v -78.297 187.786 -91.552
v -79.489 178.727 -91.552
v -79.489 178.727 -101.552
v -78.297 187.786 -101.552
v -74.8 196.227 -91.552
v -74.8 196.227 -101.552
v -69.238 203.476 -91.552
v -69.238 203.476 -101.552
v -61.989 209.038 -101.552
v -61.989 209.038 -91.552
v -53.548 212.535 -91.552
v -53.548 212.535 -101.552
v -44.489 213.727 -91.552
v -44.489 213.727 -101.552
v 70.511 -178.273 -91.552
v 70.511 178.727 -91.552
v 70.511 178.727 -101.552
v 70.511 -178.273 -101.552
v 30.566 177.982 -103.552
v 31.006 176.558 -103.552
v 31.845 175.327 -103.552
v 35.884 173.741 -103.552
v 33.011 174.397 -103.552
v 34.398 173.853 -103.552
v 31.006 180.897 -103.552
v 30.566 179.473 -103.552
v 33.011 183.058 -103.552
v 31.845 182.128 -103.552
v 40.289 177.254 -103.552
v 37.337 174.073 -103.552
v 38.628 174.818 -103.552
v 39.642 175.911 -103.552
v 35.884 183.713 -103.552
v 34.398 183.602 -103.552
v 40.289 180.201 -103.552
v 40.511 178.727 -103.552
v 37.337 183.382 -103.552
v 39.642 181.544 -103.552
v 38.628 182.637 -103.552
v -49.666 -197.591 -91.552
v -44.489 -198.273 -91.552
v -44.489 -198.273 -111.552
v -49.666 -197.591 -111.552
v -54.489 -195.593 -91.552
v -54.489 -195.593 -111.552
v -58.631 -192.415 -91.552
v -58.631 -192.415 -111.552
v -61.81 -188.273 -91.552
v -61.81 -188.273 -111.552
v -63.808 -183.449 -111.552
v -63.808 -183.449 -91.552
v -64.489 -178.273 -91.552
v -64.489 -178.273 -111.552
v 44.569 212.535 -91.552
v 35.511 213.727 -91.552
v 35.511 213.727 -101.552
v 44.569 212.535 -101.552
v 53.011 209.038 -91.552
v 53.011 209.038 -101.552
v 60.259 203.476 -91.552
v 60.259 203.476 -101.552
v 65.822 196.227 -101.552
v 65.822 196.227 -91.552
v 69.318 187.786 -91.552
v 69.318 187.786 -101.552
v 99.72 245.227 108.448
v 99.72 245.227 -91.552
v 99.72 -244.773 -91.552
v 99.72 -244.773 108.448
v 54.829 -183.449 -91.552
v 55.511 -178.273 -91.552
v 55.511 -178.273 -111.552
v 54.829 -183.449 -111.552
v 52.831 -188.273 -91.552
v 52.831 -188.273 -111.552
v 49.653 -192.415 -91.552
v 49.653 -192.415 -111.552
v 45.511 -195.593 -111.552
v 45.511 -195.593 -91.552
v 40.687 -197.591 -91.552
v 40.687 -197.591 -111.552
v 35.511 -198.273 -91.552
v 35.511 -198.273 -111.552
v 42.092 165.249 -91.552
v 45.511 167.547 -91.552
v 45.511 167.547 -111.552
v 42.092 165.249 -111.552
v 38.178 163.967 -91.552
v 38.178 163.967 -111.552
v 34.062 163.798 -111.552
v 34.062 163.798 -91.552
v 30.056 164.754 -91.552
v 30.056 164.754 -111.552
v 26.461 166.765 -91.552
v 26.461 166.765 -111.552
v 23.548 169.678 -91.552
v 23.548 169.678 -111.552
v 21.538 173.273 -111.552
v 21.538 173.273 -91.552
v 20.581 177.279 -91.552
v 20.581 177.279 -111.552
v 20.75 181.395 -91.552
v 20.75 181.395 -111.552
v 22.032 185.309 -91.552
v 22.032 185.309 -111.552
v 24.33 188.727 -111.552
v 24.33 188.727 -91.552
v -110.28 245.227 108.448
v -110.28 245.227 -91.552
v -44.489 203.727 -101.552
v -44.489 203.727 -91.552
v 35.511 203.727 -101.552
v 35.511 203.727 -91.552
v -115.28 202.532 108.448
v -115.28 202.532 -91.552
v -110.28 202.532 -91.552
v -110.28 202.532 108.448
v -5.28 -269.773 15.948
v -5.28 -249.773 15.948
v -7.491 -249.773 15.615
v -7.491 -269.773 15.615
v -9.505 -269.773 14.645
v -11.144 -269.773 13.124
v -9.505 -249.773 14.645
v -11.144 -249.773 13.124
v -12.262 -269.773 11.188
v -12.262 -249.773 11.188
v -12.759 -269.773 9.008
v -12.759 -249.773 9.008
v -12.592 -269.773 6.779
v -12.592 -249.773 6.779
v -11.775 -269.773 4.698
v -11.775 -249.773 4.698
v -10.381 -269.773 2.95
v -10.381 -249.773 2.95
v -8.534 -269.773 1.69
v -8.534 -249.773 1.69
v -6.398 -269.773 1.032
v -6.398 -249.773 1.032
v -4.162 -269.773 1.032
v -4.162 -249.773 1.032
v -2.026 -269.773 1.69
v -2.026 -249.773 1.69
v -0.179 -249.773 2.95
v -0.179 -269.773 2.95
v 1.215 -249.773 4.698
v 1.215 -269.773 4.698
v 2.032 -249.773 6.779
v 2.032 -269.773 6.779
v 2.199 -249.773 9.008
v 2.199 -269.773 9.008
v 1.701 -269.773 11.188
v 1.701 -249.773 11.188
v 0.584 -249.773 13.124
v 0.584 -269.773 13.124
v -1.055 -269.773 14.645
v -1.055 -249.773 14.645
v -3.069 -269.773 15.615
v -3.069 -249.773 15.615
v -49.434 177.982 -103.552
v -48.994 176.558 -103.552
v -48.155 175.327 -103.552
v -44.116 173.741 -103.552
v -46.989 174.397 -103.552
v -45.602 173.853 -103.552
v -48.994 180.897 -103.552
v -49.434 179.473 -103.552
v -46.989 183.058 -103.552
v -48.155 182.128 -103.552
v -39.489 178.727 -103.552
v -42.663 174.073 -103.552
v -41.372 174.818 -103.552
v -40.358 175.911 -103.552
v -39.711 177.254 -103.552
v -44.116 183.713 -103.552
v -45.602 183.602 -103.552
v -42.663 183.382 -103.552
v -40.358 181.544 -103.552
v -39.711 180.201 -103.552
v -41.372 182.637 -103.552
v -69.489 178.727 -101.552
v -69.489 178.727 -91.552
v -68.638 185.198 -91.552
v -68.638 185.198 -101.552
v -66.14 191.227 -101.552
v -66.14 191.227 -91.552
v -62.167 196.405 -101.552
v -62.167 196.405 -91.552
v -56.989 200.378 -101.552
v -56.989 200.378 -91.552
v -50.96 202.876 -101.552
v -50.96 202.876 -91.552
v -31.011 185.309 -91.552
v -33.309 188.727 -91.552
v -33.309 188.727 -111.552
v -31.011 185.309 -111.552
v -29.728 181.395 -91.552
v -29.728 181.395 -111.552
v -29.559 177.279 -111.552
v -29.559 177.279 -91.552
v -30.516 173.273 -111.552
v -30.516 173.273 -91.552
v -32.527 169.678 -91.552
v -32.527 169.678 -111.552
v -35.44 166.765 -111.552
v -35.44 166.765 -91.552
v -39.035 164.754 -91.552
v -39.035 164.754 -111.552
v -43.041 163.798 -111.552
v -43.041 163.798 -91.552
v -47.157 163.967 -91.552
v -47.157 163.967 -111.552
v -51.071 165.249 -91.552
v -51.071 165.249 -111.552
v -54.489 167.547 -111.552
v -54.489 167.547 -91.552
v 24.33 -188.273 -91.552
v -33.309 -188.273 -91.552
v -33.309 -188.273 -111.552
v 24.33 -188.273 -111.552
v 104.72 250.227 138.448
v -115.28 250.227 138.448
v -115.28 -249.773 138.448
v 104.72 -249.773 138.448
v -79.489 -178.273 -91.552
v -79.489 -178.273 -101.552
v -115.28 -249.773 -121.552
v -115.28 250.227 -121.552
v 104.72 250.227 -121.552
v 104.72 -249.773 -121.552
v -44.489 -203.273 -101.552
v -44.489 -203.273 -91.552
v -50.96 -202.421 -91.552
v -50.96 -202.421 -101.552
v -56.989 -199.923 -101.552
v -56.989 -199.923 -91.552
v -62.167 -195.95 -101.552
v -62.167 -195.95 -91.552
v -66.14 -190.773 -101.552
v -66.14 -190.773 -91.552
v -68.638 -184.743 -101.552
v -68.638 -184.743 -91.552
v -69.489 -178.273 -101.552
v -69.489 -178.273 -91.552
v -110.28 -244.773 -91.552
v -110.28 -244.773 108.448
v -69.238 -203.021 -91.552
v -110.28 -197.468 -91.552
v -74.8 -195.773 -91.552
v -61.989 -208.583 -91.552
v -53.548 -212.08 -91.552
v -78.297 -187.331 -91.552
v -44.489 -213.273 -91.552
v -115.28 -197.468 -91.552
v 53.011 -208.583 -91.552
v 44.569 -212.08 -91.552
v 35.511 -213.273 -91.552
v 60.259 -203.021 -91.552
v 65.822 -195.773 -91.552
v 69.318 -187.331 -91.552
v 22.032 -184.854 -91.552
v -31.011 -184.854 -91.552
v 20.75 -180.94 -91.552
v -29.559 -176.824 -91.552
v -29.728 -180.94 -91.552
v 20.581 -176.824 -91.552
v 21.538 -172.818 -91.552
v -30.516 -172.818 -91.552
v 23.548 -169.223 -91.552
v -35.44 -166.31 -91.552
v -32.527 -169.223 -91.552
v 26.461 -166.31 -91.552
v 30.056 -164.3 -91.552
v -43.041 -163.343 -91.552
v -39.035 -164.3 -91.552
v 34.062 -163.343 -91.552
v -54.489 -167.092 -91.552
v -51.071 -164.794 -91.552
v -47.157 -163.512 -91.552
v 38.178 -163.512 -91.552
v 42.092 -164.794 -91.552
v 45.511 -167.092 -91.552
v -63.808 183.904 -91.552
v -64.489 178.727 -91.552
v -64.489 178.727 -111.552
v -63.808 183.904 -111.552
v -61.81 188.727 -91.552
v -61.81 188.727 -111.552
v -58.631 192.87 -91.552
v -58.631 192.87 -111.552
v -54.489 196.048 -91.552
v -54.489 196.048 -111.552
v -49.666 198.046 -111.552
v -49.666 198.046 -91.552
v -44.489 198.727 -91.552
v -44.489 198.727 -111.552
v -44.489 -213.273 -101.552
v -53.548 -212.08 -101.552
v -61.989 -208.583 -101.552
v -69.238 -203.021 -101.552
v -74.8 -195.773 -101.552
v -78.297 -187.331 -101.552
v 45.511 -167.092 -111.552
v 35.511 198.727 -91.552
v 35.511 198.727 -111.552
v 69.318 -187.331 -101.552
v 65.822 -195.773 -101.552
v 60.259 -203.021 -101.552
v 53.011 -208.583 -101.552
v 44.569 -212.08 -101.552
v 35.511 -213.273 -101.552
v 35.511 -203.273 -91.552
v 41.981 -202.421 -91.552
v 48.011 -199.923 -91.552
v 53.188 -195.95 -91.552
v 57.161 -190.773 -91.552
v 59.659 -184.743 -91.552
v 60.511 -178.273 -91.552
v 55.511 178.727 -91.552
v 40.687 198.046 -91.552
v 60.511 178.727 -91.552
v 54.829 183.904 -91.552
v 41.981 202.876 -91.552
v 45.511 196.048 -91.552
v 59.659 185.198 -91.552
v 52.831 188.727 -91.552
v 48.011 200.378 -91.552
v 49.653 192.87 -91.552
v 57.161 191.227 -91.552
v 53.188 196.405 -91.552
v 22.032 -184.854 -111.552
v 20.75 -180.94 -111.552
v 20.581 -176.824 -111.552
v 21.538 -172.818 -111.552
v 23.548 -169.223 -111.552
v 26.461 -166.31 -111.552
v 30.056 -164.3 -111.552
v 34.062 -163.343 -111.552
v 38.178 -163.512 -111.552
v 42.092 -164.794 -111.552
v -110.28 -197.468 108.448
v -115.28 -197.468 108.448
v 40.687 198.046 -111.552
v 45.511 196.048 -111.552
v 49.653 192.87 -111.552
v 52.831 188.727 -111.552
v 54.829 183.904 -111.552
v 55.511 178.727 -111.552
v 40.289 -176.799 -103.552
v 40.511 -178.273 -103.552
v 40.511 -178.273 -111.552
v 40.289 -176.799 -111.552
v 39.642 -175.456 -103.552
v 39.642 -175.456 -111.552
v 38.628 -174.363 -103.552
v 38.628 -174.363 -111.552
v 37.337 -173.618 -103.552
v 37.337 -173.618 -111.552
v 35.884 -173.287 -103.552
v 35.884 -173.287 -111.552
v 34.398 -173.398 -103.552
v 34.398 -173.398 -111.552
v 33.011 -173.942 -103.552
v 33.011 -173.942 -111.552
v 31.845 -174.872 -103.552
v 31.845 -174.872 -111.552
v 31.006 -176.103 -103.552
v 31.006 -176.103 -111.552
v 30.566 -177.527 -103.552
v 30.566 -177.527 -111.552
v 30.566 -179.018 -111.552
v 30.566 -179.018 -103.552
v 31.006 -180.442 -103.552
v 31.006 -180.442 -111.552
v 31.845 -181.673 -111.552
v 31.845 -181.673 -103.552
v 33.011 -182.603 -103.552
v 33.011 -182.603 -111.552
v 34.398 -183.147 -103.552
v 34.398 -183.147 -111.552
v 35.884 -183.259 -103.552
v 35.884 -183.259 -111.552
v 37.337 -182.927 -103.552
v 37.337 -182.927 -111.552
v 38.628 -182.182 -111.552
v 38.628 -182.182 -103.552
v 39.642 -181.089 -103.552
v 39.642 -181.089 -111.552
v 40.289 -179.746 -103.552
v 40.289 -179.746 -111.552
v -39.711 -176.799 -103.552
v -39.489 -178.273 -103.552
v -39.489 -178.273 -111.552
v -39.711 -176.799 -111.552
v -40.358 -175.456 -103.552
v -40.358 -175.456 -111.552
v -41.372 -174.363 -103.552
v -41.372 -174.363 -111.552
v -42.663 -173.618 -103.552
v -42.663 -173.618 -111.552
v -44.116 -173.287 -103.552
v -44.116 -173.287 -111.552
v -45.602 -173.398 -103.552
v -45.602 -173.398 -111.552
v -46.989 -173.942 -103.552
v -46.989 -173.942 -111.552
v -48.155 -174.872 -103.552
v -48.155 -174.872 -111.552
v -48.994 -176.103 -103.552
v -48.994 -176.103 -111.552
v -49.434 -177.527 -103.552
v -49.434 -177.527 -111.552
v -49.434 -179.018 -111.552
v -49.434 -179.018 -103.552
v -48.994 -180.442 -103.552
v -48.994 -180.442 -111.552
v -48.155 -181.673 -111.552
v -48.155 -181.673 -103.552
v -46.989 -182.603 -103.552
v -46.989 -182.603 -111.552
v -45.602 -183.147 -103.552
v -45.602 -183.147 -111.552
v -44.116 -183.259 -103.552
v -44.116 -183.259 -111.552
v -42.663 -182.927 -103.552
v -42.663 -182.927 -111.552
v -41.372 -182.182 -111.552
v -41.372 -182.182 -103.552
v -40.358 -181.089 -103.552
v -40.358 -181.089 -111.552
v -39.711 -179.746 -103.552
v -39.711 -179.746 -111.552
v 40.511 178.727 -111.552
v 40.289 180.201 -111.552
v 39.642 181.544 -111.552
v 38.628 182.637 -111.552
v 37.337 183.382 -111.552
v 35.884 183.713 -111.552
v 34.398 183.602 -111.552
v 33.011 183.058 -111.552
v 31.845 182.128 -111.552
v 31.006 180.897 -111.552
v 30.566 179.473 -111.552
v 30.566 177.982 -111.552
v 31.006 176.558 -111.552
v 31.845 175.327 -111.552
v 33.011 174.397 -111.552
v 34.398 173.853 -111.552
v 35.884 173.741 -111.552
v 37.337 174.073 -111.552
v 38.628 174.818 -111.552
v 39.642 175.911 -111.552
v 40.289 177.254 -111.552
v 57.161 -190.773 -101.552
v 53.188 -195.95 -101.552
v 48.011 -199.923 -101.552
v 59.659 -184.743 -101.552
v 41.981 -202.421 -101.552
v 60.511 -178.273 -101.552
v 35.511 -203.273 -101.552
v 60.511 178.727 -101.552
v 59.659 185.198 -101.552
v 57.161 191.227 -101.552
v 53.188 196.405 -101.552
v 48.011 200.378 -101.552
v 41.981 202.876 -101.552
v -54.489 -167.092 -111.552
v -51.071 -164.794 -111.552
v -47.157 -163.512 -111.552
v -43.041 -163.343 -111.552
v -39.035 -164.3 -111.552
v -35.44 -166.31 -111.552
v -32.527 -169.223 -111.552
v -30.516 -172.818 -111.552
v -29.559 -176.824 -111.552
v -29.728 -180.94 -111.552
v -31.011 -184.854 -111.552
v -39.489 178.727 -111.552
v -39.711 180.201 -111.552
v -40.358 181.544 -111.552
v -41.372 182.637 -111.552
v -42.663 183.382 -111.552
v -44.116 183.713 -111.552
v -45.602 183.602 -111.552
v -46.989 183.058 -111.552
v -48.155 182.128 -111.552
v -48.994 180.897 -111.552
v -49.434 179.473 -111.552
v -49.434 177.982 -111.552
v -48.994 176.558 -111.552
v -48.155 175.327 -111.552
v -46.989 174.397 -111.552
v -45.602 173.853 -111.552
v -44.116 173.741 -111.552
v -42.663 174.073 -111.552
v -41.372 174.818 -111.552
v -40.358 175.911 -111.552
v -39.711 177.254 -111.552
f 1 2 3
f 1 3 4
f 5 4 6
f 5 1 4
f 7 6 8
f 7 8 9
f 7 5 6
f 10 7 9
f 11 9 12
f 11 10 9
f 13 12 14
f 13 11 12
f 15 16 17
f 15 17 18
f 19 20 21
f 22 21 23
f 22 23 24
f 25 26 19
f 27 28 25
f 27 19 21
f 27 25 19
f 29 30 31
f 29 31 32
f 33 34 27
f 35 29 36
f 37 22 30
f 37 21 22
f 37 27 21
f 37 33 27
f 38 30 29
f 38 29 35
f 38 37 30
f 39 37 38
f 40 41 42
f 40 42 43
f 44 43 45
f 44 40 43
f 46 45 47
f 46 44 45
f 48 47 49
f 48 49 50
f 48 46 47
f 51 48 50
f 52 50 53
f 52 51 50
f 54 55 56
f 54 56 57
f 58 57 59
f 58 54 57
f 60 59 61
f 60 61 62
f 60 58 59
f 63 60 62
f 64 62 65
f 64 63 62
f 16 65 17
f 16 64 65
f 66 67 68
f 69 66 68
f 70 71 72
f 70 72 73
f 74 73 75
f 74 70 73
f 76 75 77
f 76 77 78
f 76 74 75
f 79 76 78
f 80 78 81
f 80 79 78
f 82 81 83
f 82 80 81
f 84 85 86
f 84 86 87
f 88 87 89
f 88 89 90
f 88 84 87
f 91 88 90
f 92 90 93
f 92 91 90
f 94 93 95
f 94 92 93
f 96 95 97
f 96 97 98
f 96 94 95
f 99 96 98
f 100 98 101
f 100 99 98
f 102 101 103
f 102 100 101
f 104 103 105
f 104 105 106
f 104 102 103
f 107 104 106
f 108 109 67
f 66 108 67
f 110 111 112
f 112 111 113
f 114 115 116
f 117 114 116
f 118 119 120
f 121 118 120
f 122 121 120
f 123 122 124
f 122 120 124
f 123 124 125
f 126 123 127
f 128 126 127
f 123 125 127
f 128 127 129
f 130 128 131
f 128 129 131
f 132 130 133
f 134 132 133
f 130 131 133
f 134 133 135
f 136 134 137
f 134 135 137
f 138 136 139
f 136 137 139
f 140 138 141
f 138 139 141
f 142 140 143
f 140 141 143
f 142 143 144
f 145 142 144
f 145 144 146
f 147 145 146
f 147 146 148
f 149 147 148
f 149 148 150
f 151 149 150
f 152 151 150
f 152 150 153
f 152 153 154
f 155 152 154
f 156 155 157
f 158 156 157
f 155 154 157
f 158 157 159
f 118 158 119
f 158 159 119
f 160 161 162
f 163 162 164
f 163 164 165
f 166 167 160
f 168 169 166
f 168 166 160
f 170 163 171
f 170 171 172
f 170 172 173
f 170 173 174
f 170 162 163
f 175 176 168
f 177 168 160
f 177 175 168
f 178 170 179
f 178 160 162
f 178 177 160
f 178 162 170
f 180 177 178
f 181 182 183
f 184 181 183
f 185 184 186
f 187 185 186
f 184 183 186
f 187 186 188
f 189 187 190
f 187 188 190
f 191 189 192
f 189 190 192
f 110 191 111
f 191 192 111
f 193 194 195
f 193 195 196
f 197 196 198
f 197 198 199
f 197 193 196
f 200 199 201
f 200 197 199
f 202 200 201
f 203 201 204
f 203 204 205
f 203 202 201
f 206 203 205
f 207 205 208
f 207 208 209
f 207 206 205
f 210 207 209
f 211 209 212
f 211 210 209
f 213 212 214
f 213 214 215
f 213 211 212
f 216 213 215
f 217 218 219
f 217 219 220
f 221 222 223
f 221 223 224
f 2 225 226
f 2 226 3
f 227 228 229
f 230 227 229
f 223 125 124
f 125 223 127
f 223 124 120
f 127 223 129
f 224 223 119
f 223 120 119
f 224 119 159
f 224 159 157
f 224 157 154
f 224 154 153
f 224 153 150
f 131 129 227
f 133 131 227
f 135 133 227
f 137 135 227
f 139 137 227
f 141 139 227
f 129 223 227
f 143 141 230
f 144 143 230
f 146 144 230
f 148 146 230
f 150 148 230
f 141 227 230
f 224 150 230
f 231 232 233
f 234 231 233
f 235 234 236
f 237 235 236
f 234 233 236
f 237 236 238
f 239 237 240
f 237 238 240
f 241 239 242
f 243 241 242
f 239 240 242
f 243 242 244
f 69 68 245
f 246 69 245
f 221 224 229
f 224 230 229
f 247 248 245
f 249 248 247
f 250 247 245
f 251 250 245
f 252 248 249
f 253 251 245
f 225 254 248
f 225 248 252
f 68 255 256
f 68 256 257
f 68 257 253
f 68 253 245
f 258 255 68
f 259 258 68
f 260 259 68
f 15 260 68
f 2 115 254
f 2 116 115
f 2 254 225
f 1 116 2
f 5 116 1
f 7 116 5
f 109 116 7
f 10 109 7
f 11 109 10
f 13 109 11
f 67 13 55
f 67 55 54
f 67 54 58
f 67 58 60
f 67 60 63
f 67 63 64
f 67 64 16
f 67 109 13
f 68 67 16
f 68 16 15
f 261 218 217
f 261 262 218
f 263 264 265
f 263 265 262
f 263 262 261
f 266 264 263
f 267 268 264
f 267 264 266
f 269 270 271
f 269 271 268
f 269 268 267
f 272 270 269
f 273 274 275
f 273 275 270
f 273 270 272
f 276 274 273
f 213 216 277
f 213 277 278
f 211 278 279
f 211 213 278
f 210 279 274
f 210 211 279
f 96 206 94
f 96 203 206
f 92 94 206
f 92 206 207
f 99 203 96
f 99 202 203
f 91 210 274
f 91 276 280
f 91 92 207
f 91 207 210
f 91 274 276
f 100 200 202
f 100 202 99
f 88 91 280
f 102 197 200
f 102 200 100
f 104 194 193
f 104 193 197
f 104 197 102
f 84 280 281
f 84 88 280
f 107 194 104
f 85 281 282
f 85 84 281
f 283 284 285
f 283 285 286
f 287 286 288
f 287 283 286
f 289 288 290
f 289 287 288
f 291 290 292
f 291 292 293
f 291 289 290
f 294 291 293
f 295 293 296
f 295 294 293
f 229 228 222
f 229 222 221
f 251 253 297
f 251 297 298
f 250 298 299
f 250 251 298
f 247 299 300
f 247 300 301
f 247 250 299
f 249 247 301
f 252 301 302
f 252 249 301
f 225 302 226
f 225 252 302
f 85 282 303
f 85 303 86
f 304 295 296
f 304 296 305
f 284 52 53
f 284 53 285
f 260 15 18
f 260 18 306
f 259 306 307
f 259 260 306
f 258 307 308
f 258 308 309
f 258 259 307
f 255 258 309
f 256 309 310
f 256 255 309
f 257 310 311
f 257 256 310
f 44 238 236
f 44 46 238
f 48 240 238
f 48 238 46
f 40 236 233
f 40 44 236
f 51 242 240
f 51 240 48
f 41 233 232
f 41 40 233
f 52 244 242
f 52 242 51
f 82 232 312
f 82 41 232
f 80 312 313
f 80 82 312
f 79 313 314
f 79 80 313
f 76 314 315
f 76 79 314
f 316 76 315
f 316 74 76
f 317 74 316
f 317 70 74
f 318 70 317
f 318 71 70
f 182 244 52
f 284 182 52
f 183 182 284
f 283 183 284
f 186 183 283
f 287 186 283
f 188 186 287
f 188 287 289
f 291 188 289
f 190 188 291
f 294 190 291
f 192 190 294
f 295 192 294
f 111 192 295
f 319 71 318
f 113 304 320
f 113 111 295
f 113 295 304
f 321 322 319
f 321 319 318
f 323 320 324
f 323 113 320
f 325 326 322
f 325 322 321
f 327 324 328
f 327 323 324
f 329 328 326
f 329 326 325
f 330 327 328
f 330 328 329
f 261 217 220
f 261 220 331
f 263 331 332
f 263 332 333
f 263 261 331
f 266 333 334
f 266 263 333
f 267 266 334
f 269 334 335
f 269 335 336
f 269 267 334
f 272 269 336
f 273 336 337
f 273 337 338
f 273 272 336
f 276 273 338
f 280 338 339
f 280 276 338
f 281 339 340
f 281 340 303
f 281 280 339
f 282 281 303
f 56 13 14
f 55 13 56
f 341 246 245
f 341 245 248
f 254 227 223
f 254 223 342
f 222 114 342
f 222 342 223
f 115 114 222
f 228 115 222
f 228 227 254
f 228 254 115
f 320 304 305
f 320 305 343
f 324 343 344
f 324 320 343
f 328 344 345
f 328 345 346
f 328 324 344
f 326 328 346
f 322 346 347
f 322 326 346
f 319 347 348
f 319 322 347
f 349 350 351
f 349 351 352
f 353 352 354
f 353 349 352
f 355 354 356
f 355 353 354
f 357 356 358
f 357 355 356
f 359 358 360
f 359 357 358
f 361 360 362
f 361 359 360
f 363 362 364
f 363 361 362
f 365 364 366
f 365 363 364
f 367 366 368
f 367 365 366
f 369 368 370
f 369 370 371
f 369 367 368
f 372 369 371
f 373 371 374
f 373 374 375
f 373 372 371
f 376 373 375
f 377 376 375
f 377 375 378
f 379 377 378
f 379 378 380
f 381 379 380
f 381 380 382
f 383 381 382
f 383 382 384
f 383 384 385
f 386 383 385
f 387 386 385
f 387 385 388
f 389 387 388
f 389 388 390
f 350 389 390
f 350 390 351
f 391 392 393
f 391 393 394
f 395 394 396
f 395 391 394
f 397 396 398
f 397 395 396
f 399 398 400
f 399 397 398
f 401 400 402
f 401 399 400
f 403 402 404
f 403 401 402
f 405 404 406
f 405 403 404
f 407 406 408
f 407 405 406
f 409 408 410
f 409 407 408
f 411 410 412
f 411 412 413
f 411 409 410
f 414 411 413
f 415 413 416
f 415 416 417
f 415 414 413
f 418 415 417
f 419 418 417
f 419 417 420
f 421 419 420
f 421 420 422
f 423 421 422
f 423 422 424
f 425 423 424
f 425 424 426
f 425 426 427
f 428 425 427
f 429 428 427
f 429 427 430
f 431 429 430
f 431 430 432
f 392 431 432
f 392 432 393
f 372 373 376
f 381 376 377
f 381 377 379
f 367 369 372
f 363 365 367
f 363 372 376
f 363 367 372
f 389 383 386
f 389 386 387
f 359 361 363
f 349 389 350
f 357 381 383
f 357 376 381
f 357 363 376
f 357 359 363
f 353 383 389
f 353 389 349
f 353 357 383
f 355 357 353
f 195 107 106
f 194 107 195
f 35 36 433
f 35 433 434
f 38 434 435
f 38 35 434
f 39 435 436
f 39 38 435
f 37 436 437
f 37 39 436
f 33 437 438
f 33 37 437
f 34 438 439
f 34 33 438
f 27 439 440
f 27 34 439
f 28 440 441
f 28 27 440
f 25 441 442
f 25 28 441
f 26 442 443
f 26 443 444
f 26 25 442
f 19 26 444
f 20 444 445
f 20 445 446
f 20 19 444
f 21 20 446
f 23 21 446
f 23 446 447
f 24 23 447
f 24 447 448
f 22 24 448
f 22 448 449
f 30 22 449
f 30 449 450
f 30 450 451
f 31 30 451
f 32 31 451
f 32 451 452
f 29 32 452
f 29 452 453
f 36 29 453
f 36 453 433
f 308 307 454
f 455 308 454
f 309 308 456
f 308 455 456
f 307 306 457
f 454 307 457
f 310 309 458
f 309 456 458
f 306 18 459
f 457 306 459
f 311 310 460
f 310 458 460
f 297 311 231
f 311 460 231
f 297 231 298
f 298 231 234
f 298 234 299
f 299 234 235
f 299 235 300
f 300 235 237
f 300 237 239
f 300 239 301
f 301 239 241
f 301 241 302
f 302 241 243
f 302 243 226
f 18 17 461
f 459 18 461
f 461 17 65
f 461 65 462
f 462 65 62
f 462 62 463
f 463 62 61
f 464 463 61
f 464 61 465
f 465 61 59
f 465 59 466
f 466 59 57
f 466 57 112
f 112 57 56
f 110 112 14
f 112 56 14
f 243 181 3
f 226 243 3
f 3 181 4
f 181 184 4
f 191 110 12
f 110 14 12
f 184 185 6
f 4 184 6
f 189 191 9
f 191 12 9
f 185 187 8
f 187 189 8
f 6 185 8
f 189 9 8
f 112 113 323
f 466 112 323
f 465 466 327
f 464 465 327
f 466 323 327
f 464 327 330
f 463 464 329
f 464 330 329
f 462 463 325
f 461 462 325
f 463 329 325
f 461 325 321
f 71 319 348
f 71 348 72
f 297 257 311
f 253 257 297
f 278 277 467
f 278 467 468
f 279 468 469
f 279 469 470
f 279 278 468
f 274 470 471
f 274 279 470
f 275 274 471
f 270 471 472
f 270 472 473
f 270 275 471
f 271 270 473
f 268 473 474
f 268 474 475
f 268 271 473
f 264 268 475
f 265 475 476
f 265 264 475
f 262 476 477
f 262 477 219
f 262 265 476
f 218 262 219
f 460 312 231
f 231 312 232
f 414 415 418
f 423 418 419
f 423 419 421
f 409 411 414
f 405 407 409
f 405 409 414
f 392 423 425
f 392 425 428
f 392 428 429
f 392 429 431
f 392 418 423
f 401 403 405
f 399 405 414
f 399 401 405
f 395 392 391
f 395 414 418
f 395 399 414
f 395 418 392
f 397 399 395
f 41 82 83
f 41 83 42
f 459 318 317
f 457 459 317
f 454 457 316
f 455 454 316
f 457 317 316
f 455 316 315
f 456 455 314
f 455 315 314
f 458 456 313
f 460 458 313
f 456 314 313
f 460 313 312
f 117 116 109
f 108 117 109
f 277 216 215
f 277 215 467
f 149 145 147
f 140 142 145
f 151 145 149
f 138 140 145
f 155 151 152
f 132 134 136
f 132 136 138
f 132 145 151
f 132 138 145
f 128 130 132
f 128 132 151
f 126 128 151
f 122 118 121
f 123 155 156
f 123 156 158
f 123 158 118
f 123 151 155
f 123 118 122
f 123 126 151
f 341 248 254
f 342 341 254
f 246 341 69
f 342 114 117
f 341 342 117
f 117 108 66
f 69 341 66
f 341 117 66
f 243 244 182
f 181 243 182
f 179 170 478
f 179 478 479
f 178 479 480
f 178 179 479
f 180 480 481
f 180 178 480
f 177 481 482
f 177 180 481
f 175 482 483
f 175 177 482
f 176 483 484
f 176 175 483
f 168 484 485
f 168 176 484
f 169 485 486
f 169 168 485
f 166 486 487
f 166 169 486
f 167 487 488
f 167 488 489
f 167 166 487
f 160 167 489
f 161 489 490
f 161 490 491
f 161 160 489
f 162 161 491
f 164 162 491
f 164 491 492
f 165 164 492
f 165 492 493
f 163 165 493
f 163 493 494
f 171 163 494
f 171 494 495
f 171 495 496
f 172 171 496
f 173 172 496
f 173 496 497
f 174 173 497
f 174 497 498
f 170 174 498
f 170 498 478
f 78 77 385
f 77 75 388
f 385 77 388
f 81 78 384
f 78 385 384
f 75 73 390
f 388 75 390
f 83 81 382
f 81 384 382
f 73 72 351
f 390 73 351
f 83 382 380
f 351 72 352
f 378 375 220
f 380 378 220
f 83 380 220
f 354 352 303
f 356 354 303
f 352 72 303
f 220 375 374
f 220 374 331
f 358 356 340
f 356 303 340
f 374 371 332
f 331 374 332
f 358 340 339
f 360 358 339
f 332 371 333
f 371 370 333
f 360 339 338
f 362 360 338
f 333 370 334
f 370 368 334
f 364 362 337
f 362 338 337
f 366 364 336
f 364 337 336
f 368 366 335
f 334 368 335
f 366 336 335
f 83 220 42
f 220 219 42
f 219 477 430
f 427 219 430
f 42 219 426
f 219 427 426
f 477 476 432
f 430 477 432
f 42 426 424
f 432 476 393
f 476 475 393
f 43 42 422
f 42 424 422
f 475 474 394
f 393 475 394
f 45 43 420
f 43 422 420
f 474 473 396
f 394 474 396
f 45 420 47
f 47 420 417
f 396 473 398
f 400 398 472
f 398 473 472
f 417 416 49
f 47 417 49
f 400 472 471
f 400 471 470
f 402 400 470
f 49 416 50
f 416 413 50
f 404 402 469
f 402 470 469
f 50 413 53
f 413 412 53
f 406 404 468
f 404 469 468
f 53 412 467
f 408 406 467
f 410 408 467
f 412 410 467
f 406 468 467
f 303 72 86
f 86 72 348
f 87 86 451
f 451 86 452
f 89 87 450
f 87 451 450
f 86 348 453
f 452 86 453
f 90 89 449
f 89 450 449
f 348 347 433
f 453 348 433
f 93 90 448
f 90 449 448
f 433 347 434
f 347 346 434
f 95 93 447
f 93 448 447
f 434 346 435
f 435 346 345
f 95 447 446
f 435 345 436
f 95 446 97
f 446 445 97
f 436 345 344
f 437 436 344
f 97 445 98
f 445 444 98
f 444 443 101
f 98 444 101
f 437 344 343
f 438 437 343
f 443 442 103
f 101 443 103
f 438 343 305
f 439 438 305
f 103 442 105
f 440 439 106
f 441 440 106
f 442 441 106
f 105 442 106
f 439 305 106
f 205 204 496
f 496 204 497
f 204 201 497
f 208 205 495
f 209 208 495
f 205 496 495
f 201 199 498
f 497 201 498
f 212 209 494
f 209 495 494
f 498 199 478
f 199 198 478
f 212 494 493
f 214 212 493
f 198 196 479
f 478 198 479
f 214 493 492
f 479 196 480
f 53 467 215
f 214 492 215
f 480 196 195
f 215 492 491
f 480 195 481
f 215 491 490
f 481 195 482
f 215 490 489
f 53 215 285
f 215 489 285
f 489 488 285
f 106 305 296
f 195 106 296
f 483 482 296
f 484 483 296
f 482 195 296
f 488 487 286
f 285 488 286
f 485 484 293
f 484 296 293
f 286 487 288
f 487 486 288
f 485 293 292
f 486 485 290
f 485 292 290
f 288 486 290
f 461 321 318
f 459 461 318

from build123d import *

# Parameters (mm, degrees)
SKETCH_2_W          = 22
SKETCH_2_H          = 50
EXTRUDE_1_DEPTH     = 3
EXTRUDE_2_DEPTH     = 20
CUT_EXTRUDE_1_DEPTH = 1
SKETCH_4_3_R        = 0.5
CUT_EXTRUDE_2_DEPTH = 2
SKETCH_5_W          = 22
SKETCH_5_H          = 50
EXTRUDE_3_DEPTH     = 3
SKETCH_8_R          = 0.5
CUT_EXTRUDE_3_DEPTH = 1.2
SKETCH_9_R          = 0.75
EXTRUDE_4_DEPTH     = 2
SCALE_1_SCALE       = 10


with BuildPart() as part:
    # 草图2 → 凸台-拉伸1 (new body)
    with BuildSketch(Plane.XY):
        Rectangle(SKETCH_2_W, SKETCH_2_H)
    extrude(amount=EXTRUDE_1_DEPTH)

    # 草图3 → 凸台-拉伸2 (add)
    with BuildSketch(Plane.XY.offset(3)):
        Polygon((-11, 20.230452477), (-10.5, 20.230452477), (-10.5, 24.5), (10.5, 24.5), (10.5, -24.5), (-10.5, -24.5), (-10.5, -19.769547523), (-11, -19.769547523), (-11, -25), (11, -25), (11, 25), (-11, 25), align=None)
    extrude(amount=EXTRUDE_2_DEPTH)

    # 草图4 → 切除-拉伸1 (cut)
    with BuildSketch(Plane.XY.offset(3)):
        with BuildLine():
            Line((7.579070714, -17.85), (7.579070714, 17.85))
            ThreePointArc((7.579070714, 17.85), (6.553944448, 20.324873734), (4.079070714, 21.35))
            Line((4.079070714, 21.35), (-3.920929286, 21.35))
            ThreePointArc((-3.920929286, 21.35), (-6.39580302, 20.324873734), (-7.420929286, 17.85))
            Line((-7.420929286, 17.85), (-7.420929286, -17.85))
            ThreePointArc((-7.420929286, -17.85), (-6.39580302, -20.324873734), (-3.920929286, -21.35))
            Line((-3.920929286, -21.35), (4.079070714, -21.35))
            ThreePointArc((4.079070714, -21.35), (6.553944448, -20.324873734), (7.579070714, -17.85))
        make_face()
        with BuildLine():
            Line((6.579070714, 17.85), (6.579070714, -17.85))
            ThreePointArc((6.579070714, -17.85), (5.846837667, -19.617766953), (4.079070714, -20.35))
            Line((4.079070714, -20.35), (-3.920929286, -20.35))
            ThreePointArc((-3.920929286, -20.35), (-5.688696239, -19.617766953), (-6.420929286, -17.85))
            Line((-6.420929286, -17.85), (-6.420929286, 17.85))
            ThreePointArc((-6.420929286, 17.85), (-5.688696239, 19.617766953), (-3.920929286, 20.35))
            Line((-3.920929286, 20.35), (4.079070714, 20.35))
            ThreePointArc((4.079070714, 20.35), (5.846837667, 19.617766953), (6.579070714, 17.85))
        make_face(mode=Mode.SUBTRACT)
    extrude(amount=-CUT_EXTRUDE_1_DEPTH, mode=Mode.SUBTRACT)

    # 草图4<3> → 切除-拉伸2 (cut)
    with BuildSketch(Plane.XY.offset(3)):
        with BuildLine():
            Line((6.079070714, -17.85), (6.079070714, 17.85))
            ThreePointArc((6.079070714, 17.85), (5.493284277, 19.264213562), (4.079070714, 19.85))
            Line((4.079070714, 19.85), (-3.920929286, 19.85))
            ThreePointArc((-3.920929286, 19.85), (-5.335142848, 19.264213562), (-5.920929286, 17.85))
            Line((-5.920929286, 17.85), (-5.920929286, -17.85))
            ThreePointArc((-5.920929286, -17.85), (-5.335142848, -19.264213562), (-3.920929286, -19.85))
            Line((-3.920929286, -19.85), (4.079070714, -19.85))
            ThreePointArc((4.079070714, -19.85), (5.493284277, -19.264213562), (6.079070714, -17.85))
        make_face()
        with Locations((-3.920929286, -17.85)):
            Circle(SKETCH_4_3_R, mode=Mode.SUBTRACT)
        with Locations((4.079070714, -17.85)):
            Circle(SKETCH_4_3_R, mode=Mode.SUBTRACT)
        with BuildLine():
            Line((5.079070714, 16.731966011), (5.079070714, -16.731966011))
            ThreePointArc((5.079070714, -16.731966011), (3.018410542, -16.789339828), (2.961036725, -18.85))
            Line((2.961036725, -18.85), (-2.802895297, -18.85))
            ThreePointArc((-2.802895297, -18.85), (-2.860269114, -16.789339828), (-4.920929286, -16.731966011))
            Line((-4.920929286, -16.731966011), (-4.920929286, 16.731966011))
            ThreePointArc((-4.920929286, 16.731966011), (-2.860269114, 16.789339828), (-2.802895297, 18.85))
            Line((-2.802895297, 18.85), (2.961036725, 18.85))
            ThreePointArc((2.961036725, 18.85), (3.018410542, 16.789339828), (5.079070714, 16.731966011))
        make_face(mode=Mode.SUBTRACT)
        with Locations((-3.920929286, 17.85)):
            Circle(SKETCH_4_3_R, mode=Mode.SUBTRACT)
        with Locations((4.079070714, 17.85)):
            Circle(SKETCH_4_3_R, mode=Mode.SUBTRACT)
    extrude(amount=-CUT_EXTRUDE_2_DEPTH, mode=Mode.SUBTRACT)

    # 草图5 → 凸台-拉伸3 (add)
    with BuildSketch(Plane.XY.offset(23)):
        Rectangle(SKETCH_5_W, SKETCH_5_H)
    extrude(amount=EXTRUDE_3_DEPTH)

    # 草图8 → 切除-拉伸3 (cut)
    with BuildSketch(Plane.XY.offset(3)):
        with Locations((4.079070714, -17.85)):
            Circle(SKETCH_8_R)
        with Locations((4.079070714, 17.85)):
            Circle(SKETCH_8_R)
        with Locations((-3.920929286, 17.85)):
            Circle(SKETCH_8_R)
        with Locations((-3.920929286, -17.85)):
            Circle(SKETCH_8_R)
    extrude(amount=-CUT_EXTRUDE_3_DEPTH, mode=Mode.SUBTRACT)

    # 草图9 → 凸台-拉伸4 (add)
    with BuildSketch(Plane.XZ.offset(25)):
        with Locations((0, 13)):
            Circle(SKETCH_9_R)
    extrude(amount=EXTRUDE_4_DEPTH)


with BuildPart() as part_1:
    # 缩放比例1: scaled about (0.58667368, -0.025272028, 13.505805339)
    add(part.part.scale(SCALE_1_SCALE).moved(Location((-5.28006312, 0.227448252, -121.552248051))))


solid = part_1.part
